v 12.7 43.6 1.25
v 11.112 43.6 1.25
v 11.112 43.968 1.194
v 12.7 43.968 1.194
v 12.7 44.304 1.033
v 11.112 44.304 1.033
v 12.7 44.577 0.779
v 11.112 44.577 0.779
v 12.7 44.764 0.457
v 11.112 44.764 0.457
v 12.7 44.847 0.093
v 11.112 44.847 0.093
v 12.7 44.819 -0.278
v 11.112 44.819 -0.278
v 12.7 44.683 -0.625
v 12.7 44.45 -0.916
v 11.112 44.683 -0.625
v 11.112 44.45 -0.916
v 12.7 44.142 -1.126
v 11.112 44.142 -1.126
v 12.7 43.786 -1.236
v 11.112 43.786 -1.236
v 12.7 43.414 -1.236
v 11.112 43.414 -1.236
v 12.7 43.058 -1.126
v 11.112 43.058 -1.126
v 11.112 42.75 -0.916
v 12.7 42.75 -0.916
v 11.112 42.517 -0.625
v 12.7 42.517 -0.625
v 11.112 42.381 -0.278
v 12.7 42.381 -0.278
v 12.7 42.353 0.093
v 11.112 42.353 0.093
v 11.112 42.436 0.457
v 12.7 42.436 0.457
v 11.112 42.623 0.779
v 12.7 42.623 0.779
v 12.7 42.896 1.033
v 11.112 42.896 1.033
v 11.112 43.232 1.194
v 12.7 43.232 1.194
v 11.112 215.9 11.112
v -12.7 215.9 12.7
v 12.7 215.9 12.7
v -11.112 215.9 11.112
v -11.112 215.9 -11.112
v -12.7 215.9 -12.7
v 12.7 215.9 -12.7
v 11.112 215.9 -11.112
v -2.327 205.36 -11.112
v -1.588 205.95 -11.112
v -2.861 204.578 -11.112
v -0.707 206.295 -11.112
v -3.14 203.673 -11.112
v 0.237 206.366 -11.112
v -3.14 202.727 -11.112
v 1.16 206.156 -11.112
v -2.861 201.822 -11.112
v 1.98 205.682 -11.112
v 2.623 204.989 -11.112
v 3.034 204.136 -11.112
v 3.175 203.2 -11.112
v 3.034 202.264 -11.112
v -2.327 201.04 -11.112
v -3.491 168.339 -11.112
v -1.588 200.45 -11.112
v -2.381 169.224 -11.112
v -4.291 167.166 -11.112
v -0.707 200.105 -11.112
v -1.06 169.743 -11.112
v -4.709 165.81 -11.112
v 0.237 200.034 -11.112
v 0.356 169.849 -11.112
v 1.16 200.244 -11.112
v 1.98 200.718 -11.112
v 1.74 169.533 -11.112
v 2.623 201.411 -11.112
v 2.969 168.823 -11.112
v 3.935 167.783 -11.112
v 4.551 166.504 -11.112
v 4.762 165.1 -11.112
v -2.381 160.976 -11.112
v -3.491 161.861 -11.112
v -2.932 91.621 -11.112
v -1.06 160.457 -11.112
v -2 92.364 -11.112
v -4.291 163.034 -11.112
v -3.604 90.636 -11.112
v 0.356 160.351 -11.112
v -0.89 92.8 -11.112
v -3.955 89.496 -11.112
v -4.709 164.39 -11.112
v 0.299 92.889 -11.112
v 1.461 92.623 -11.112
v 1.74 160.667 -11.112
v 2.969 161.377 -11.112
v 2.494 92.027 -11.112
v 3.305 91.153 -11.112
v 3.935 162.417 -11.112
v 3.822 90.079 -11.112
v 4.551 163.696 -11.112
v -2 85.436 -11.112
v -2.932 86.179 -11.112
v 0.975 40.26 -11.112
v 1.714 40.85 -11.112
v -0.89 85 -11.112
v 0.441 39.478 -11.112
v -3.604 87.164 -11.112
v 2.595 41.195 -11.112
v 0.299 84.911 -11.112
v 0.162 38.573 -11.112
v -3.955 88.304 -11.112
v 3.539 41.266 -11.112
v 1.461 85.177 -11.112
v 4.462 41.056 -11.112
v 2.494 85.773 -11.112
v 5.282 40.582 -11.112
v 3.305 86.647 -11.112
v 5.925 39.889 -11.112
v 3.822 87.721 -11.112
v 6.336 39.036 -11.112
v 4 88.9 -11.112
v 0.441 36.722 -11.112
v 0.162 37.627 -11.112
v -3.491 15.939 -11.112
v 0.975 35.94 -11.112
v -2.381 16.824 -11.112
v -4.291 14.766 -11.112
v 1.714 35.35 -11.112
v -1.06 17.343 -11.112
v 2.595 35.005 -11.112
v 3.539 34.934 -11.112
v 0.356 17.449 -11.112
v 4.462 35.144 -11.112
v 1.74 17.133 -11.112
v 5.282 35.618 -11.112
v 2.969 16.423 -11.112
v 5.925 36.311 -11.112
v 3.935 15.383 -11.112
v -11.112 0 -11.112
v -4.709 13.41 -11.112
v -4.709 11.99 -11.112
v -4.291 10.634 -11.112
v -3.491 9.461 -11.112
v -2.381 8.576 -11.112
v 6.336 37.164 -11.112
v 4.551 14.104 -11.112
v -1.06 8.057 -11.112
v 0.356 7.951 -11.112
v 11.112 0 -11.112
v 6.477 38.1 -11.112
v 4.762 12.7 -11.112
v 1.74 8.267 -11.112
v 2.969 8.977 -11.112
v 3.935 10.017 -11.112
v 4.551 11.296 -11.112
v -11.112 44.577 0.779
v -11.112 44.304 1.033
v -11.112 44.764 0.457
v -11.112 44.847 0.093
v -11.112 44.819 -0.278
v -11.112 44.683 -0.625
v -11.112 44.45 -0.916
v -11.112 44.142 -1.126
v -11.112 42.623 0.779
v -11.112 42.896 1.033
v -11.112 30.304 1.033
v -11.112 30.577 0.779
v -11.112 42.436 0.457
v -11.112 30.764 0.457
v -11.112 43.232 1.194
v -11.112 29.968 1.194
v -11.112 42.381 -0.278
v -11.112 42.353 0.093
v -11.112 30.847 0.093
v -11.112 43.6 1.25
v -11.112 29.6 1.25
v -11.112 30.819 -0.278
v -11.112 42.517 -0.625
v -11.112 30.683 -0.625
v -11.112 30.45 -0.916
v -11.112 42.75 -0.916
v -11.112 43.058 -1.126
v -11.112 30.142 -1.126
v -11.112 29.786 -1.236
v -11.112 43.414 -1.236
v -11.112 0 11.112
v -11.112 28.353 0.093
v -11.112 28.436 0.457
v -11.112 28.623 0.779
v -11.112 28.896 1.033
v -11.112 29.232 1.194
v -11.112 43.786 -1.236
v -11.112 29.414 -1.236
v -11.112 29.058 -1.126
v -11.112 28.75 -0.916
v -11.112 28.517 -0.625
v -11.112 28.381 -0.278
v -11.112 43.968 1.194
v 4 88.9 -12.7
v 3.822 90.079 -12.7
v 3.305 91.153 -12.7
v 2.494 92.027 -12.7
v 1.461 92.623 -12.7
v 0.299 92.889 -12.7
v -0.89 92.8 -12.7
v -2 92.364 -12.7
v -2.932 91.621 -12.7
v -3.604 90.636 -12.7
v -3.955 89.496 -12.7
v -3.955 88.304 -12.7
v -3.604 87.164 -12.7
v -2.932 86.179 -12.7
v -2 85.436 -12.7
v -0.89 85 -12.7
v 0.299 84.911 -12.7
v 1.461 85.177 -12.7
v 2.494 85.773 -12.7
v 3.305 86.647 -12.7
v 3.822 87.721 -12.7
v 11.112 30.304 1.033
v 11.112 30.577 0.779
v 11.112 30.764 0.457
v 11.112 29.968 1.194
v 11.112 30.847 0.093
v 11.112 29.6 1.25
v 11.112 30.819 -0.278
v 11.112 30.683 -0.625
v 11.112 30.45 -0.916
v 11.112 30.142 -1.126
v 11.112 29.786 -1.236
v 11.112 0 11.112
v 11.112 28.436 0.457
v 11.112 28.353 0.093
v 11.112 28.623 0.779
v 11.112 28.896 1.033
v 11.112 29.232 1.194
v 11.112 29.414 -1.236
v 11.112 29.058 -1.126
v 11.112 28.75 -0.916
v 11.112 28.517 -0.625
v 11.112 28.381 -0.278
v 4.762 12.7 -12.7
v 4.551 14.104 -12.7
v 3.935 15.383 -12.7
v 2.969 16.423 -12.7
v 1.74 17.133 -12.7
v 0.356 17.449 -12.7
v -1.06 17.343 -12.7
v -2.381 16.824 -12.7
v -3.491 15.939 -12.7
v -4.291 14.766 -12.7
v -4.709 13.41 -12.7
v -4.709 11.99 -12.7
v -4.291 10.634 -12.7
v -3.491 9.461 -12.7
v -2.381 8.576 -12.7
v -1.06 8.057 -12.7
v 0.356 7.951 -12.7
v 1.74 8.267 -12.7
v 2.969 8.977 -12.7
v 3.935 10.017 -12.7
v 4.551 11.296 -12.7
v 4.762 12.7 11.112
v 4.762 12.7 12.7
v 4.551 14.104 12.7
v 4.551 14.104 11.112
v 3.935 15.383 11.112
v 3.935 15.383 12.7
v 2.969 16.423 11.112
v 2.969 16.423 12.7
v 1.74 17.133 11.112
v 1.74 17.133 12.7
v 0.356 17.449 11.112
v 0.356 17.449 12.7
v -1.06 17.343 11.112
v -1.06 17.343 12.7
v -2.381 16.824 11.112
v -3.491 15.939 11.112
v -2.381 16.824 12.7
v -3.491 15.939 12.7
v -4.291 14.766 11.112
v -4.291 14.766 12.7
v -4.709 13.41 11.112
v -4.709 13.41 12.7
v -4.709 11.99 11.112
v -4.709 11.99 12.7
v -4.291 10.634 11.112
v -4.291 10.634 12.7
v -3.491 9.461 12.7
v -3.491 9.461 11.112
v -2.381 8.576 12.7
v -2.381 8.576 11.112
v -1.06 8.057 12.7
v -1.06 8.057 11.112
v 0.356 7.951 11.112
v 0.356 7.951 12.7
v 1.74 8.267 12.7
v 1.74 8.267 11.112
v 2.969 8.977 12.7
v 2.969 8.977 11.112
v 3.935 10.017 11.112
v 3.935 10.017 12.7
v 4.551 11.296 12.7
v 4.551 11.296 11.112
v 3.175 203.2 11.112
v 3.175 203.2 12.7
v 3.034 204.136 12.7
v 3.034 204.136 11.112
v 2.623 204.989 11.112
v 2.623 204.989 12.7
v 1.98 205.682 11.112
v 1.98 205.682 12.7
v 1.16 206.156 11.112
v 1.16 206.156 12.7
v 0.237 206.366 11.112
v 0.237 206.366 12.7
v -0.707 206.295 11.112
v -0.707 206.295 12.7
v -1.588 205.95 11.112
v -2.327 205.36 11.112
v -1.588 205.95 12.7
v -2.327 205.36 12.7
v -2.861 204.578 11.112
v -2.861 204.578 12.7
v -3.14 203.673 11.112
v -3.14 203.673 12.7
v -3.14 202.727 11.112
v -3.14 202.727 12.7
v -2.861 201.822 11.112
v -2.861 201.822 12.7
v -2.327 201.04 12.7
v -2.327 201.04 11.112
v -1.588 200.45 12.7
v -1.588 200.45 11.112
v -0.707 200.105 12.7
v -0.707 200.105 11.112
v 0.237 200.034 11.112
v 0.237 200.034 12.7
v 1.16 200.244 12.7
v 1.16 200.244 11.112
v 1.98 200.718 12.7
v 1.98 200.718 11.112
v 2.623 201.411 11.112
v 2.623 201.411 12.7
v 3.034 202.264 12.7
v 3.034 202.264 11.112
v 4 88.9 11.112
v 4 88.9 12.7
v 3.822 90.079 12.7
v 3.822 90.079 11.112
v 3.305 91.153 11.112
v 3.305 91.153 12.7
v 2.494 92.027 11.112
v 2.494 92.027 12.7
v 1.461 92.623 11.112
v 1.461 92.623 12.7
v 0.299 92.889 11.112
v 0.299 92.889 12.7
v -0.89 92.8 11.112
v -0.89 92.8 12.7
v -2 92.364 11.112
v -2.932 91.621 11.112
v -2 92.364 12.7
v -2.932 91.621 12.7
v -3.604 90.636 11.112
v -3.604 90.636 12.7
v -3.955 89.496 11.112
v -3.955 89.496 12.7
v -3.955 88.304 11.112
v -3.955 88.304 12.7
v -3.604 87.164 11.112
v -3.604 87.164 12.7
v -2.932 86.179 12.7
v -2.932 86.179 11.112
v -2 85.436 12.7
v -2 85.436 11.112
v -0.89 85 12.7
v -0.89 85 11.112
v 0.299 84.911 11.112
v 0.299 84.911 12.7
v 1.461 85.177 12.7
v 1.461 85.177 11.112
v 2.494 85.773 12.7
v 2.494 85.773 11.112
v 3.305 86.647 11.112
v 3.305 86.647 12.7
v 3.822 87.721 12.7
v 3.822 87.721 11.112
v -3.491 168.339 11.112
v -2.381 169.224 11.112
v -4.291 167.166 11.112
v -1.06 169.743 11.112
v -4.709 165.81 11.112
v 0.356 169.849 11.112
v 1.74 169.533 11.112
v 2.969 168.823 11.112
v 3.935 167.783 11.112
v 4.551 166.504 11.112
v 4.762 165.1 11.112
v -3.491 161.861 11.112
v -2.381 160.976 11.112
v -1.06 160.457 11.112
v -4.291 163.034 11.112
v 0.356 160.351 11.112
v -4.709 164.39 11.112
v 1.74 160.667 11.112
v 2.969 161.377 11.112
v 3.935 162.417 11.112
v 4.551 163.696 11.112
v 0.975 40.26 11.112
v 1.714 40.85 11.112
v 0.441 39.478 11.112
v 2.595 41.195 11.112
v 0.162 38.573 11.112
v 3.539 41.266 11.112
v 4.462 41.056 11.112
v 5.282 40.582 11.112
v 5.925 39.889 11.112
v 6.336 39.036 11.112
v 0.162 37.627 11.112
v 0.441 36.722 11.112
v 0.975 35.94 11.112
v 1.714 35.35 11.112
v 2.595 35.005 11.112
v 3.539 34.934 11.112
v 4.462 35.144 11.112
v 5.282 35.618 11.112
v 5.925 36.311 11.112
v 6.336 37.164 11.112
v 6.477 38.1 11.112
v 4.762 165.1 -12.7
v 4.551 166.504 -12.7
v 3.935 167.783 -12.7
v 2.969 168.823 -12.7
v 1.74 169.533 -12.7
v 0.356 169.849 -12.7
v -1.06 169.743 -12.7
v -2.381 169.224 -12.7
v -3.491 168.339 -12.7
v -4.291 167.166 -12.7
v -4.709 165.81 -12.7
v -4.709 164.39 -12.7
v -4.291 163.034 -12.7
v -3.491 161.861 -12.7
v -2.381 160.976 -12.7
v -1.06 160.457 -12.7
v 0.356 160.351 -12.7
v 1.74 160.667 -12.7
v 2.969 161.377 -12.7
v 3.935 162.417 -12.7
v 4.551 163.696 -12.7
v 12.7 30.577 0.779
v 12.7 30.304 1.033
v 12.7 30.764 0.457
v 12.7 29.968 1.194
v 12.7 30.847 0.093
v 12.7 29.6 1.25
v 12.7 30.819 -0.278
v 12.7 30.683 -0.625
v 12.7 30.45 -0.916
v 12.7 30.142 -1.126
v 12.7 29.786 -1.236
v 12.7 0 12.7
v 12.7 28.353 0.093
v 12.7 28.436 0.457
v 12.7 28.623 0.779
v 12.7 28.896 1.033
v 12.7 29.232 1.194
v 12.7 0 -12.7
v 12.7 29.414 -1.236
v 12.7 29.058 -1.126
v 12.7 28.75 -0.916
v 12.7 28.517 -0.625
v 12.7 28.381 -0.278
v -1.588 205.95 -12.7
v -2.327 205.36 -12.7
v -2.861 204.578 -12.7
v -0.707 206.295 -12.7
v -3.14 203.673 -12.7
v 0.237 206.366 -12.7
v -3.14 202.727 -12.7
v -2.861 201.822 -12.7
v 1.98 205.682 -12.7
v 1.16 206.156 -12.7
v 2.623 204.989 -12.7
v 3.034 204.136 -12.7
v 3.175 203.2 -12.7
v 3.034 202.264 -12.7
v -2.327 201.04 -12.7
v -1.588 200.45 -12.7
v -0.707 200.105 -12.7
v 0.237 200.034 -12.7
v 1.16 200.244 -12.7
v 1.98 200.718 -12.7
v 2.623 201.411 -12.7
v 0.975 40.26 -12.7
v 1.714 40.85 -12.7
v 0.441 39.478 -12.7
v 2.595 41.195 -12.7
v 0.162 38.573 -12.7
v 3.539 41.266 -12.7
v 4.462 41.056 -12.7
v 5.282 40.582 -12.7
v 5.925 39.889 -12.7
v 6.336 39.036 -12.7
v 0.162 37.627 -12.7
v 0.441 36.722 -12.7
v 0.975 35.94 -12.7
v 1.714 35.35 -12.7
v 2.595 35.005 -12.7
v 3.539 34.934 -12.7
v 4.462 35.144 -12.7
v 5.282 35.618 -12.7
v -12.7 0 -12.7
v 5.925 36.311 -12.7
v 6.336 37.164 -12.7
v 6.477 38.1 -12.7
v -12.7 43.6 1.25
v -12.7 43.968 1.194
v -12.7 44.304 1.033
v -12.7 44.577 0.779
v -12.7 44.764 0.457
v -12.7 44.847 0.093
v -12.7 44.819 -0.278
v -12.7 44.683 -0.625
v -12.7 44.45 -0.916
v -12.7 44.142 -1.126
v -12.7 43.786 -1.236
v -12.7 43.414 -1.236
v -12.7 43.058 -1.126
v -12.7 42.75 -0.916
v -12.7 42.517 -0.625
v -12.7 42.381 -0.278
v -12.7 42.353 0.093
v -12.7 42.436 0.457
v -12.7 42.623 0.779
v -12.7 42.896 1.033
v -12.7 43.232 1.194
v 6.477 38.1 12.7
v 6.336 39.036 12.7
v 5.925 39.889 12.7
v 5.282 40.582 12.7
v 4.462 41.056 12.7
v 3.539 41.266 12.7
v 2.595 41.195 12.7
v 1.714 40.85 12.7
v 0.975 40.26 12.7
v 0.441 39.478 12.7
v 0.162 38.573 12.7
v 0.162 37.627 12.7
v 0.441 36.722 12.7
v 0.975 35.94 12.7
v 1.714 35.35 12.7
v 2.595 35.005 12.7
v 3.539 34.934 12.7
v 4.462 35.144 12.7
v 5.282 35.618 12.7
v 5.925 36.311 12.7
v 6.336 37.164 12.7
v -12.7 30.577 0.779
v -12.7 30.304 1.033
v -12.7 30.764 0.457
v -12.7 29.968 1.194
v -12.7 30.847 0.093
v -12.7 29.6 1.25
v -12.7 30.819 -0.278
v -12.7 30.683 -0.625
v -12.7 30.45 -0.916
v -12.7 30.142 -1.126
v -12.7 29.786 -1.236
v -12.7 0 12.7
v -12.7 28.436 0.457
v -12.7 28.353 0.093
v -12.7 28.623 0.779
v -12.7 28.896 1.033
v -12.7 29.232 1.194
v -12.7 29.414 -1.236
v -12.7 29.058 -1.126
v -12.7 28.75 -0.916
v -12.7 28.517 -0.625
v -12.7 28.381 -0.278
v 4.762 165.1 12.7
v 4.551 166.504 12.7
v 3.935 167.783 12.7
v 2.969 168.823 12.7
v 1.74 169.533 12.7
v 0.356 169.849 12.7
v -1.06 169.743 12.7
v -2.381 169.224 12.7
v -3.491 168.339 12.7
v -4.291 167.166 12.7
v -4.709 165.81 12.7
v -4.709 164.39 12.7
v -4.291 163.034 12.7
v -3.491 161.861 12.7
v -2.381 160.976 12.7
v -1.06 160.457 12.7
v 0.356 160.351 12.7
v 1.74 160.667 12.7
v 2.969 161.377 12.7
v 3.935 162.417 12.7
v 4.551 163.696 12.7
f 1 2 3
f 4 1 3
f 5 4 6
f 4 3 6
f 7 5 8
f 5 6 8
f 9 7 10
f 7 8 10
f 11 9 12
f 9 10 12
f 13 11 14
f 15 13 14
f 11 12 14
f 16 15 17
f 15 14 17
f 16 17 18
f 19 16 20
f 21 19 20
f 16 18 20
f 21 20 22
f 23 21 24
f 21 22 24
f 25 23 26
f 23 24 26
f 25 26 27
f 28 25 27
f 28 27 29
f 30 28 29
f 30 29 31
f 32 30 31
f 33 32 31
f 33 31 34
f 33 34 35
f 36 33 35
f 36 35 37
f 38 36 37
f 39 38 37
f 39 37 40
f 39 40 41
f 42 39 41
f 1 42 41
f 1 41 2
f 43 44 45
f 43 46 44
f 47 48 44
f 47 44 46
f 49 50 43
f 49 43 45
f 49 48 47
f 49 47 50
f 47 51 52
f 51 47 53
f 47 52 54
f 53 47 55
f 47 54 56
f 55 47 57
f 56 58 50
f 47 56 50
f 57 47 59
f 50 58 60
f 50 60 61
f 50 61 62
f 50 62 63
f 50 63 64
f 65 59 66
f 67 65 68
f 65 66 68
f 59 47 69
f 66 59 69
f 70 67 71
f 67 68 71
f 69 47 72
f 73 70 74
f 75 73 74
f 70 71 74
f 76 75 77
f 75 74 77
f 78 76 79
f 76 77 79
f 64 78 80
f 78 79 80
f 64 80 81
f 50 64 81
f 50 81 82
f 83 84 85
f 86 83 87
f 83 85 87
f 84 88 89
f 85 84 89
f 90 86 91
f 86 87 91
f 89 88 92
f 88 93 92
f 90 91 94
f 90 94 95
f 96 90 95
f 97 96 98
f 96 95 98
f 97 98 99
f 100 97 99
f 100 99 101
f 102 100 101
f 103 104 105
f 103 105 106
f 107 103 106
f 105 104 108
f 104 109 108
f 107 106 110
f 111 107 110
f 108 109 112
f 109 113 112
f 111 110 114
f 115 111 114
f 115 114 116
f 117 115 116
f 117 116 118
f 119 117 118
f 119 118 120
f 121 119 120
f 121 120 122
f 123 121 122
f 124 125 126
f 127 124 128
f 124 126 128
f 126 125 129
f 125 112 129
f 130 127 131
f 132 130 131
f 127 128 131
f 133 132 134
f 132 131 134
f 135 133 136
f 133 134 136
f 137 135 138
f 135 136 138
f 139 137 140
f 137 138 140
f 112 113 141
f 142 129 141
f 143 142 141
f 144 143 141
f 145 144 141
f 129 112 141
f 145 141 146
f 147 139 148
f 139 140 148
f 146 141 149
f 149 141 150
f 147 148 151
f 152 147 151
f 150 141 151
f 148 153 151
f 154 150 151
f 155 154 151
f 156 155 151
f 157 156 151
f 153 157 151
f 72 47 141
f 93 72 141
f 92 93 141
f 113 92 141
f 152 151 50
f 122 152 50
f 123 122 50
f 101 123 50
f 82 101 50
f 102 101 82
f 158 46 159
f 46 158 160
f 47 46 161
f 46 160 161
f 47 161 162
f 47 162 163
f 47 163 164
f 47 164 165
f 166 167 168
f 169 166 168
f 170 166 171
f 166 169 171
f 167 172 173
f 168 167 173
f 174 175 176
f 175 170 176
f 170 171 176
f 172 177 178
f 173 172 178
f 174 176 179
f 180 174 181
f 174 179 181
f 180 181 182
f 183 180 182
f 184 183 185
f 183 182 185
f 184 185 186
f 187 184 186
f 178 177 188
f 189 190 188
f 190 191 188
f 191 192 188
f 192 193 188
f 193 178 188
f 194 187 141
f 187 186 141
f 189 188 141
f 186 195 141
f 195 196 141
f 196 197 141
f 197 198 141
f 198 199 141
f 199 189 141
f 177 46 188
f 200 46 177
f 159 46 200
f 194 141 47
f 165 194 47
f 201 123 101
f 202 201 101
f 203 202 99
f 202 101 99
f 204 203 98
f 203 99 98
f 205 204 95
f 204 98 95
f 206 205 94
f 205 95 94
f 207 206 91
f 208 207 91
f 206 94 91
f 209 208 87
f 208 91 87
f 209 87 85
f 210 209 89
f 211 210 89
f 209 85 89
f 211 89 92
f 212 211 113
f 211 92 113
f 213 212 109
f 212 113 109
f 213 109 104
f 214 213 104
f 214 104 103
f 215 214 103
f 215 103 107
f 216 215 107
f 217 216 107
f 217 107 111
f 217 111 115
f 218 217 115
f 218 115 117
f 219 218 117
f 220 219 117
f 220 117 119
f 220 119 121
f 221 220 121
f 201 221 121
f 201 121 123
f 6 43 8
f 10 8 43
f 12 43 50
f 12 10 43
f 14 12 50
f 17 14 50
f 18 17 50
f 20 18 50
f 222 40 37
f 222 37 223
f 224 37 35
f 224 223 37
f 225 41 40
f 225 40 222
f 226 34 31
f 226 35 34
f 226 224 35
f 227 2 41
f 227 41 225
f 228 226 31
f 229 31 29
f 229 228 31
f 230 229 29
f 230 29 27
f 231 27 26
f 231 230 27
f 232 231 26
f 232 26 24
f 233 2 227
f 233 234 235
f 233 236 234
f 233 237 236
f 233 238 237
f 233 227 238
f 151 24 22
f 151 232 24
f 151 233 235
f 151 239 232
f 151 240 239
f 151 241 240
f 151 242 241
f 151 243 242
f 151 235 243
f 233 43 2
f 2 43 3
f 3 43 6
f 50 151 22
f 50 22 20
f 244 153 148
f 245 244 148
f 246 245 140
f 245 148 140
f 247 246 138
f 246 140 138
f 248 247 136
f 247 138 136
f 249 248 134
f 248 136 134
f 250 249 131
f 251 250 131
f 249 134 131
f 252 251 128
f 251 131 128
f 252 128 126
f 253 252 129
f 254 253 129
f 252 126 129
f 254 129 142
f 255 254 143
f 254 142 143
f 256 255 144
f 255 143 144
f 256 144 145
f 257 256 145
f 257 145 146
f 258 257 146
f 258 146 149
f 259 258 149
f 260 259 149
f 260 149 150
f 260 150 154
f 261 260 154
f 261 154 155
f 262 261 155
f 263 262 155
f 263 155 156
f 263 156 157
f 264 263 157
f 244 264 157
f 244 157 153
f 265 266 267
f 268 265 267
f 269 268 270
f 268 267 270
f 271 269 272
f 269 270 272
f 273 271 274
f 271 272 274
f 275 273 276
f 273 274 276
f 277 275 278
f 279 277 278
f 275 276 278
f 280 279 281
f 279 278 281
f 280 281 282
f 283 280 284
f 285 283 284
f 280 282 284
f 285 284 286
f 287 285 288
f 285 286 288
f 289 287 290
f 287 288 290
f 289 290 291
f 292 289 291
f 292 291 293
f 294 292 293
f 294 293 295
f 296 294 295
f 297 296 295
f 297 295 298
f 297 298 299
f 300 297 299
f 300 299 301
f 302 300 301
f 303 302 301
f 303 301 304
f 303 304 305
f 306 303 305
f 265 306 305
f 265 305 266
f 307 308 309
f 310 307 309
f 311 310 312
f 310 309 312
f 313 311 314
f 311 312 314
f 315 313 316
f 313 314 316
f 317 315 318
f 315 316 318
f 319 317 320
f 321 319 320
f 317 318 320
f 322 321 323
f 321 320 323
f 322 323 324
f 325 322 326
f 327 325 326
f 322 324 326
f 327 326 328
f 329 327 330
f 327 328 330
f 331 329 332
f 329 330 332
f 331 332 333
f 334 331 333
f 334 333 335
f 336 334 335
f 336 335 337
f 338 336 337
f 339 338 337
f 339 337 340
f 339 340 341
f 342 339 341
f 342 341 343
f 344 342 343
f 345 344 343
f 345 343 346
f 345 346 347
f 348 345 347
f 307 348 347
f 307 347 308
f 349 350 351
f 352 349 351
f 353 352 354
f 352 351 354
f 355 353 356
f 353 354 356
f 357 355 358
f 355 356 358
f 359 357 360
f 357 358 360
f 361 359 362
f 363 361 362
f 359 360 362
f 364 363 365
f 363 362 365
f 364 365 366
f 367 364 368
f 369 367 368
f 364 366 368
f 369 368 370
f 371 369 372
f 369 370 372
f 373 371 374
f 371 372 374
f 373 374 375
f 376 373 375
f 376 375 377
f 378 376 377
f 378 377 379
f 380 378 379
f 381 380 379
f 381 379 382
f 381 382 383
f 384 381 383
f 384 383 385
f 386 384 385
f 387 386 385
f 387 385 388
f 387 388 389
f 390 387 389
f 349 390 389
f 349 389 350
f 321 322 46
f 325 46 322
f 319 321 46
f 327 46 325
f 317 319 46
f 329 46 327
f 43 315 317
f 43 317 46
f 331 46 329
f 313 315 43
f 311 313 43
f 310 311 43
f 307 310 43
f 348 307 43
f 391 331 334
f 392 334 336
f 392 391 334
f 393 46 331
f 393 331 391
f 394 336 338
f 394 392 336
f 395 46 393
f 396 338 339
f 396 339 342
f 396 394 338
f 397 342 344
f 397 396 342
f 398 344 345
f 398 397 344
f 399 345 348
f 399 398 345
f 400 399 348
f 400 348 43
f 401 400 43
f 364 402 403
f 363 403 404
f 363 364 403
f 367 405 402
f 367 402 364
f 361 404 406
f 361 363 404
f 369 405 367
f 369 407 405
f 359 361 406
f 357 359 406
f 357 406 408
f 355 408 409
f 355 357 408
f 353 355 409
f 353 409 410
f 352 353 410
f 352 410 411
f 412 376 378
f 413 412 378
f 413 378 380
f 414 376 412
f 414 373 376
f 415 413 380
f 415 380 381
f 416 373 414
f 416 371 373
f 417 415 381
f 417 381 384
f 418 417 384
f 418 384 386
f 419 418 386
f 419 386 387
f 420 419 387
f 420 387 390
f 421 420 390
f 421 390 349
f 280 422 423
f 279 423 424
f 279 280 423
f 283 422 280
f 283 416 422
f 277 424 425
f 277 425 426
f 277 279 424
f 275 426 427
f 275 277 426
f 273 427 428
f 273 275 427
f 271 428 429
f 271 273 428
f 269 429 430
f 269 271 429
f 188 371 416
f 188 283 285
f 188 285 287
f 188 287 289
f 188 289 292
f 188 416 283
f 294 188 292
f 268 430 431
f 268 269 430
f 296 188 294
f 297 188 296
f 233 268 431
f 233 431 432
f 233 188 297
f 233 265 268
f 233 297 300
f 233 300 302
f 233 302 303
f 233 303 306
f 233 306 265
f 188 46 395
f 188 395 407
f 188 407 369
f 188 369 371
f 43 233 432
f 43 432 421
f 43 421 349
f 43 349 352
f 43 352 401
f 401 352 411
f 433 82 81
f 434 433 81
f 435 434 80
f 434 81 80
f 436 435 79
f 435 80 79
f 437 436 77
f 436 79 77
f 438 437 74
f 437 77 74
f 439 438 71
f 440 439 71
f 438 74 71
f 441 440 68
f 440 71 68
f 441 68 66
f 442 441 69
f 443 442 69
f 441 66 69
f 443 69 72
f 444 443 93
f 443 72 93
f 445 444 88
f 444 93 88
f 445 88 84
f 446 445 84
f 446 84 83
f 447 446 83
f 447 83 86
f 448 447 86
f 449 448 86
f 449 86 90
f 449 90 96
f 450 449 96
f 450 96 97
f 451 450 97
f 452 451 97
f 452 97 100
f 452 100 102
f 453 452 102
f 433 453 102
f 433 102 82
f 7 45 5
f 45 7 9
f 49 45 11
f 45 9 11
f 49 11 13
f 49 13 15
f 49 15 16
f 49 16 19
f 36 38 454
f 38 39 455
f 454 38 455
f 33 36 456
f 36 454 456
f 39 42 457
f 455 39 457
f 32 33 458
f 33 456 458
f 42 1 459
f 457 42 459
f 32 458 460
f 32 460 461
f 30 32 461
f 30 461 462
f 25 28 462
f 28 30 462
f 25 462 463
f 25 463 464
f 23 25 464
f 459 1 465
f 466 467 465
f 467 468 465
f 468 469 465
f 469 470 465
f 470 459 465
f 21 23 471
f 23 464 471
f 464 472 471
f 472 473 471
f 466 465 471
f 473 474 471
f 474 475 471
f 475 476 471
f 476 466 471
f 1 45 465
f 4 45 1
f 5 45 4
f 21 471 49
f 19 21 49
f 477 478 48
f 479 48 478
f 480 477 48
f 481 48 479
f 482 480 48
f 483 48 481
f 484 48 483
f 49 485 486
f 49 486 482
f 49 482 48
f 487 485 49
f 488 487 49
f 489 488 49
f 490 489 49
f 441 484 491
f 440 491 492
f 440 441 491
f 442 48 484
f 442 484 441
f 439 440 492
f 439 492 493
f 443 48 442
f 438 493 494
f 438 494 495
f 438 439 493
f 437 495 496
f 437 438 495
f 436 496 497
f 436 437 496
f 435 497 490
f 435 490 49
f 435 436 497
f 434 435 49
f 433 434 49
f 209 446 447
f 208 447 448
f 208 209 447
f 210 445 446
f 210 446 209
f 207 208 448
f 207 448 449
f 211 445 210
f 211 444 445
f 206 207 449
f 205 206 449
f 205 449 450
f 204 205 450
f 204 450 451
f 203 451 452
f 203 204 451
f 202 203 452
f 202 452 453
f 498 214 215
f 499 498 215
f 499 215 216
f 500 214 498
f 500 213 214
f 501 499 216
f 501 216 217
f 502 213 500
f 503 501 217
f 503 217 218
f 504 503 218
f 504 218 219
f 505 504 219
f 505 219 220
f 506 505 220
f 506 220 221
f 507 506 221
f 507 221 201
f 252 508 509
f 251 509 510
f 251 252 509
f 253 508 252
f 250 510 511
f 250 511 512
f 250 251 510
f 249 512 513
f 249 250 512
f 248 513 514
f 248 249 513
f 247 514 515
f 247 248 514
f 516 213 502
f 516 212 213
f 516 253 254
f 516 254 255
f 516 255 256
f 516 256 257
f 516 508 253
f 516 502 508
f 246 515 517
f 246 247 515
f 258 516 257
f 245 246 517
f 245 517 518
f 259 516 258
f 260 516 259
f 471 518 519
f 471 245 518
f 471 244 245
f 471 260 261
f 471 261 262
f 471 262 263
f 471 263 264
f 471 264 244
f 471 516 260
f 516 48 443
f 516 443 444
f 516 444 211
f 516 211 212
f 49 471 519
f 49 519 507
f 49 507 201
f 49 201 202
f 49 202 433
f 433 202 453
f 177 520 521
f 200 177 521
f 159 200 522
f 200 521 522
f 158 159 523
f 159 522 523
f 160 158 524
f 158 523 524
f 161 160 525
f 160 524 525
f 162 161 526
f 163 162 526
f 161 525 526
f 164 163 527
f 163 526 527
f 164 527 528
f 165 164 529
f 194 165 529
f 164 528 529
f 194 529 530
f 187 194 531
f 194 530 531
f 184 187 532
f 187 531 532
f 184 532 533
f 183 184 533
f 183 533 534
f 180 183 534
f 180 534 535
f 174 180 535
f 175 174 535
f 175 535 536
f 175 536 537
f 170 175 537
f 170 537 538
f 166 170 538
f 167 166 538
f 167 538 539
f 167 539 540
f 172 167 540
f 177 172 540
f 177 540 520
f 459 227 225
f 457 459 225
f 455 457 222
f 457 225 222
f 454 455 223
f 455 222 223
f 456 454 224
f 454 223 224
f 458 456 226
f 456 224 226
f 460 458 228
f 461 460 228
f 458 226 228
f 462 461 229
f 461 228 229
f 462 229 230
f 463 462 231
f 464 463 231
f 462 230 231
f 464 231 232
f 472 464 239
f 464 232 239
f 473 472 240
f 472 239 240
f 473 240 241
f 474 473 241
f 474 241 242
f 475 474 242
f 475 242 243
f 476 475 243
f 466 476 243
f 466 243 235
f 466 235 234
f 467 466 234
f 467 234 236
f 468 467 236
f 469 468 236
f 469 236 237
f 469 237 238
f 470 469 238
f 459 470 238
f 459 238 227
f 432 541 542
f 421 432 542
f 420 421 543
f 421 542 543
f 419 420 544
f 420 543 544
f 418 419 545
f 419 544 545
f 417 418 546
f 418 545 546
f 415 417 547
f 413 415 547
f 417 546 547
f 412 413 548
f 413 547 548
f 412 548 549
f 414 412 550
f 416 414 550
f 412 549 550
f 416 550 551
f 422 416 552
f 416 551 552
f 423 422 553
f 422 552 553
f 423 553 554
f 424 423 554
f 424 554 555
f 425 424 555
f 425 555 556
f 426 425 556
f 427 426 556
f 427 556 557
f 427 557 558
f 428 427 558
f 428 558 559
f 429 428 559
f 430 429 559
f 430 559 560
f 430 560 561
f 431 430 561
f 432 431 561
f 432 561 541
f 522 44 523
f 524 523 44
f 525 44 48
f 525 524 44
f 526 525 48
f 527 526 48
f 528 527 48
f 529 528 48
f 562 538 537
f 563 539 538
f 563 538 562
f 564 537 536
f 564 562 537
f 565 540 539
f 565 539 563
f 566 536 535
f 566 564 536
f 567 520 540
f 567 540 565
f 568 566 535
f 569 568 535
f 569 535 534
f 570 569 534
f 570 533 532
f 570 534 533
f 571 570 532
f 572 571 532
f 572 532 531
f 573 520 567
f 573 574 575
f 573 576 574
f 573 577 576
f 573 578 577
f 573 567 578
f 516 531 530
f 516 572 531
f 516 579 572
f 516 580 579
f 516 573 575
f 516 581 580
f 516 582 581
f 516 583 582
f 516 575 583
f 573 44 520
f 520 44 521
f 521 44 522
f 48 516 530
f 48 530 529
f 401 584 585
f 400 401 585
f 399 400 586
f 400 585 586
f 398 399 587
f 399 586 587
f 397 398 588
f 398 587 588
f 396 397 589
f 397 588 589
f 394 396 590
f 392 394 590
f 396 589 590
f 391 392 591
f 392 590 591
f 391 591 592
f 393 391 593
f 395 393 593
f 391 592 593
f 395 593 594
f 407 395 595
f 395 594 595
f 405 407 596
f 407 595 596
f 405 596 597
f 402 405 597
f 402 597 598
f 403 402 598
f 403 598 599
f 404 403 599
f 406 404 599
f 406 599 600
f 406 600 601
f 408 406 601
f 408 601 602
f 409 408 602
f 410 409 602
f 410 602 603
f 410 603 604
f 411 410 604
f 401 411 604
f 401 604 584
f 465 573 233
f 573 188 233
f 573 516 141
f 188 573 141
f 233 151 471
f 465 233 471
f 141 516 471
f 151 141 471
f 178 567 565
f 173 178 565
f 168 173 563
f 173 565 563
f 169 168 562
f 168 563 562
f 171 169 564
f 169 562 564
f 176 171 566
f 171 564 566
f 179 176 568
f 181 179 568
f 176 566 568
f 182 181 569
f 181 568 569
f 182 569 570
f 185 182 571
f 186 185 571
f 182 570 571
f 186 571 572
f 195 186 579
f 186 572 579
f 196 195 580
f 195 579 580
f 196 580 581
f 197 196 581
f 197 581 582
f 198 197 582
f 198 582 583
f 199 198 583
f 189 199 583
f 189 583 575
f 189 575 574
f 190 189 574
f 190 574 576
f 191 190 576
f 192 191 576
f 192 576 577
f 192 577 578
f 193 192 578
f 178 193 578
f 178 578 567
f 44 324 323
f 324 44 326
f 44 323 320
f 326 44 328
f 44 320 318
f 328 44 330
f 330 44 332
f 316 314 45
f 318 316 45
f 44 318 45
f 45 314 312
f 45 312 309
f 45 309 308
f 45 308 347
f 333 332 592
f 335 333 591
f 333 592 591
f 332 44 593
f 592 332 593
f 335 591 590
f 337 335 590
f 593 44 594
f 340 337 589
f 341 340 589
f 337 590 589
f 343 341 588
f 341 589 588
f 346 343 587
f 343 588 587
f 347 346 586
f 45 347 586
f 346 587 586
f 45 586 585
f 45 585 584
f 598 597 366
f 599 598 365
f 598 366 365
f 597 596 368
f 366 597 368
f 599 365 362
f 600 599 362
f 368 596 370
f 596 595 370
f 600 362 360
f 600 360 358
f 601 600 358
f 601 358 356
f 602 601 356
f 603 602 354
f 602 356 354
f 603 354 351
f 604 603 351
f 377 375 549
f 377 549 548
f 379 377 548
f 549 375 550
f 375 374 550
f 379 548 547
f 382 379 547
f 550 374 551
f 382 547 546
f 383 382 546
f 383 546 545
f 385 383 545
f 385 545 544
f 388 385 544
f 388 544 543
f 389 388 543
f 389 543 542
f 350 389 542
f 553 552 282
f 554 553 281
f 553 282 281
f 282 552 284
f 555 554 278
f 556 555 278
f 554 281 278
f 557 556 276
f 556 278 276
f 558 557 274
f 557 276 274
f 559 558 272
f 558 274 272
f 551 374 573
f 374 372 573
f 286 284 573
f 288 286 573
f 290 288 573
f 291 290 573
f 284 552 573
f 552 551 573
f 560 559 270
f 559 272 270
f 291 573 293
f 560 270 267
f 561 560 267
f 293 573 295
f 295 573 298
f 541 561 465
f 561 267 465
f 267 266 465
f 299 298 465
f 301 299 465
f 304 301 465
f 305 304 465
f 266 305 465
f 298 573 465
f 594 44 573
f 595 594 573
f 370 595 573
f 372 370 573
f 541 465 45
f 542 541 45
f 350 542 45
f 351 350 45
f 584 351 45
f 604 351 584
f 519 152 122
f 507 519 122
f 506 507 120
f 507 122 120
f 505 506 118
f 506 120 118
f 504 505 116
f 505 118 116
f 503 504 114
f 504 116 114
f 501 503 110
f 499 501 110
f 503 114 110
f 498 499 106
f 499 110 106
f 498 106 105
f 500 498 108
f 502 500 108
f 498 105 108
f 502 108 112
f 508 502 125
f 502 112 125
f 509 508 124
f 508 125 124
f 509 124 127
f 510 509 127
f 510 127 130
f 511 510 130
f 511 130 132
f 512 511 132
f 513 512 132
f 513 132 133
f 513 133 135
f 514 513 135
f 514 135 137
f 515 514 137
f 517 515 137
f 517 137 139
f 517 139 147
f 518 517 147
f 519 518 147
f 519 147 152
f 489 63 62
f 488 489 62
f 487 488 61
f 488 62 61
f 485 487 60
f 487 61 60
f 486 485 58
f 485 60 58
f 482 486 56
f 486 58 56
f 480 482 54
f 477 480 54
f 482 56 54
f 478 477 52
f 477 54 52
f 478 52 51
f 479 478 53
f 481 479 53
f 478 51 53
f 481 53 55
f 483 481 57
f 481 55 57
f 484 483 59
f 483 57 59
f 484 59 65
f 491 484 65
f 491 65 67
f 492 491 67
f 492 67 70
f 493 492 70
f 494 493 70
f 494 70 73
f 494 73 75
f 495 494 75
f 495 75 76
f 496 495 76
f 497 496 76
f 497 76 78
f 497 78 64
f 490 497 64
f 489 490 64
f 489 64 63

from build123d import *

# Parameters (mm, degrees)
SKETCH1_W           = 25.4
SKETCH1_H           = 25.4
SKETCH1_W_2         = 22.225
SKETCH1_H_2         = 22.225
BOSS_EXTRUDE1_DEPTH = 215.9
SKETCH2_R           = 4
SKETCH2_R_2         = 4.7625
SKETCH2_R_3         = 3.175
CUT_EXTRUDE1_DEPTH  = 218.759638133
SKETCH3_R           = 3.175
CUT_EXTRUDE2_DEPTH  = 218.759638133
SKETCH5_R           = 1.25
CUT_EXTRUDE3_DEPTH  = 218.759638133


with BuildPart() as part:
    # Sketch1 → Boss-Extrude1 (new body)
    with BuildSketch(Plane(origin=(0, 0, 0), x_dir=(1, 0, 0), z_dir=(0, 1, 0))):
        Rectangle(SKETCH1_W, SKETCH1_H)
        Rectangle(SKETCH1_W_2, SKETCH1_H_2, mode=Mode.SUBTRACT)
    extrude(amount=BOSS_EXTRUDE1_DEPTH)

    # Sketch2 → Cut-Extrude1 (cut, through all)
    with BuildSketch(Plane.XY.offset(12.7)):
        with Locations((0, 88.9)):
            Circle(SKETCH2_R)
        with Locations((0, 165.1)):
            Circle(SKETCH2_R_2)
        with Locations((0, 12.7)):
            Circle(SKETCH2_R_2)
        with Locations((0, 203.2)):
            Circle(SKETCH2_R_3)
    extrude(amount=-CUT_EXTRUDE1_DEPTH, mode=Mode.SUBTRACT)

    # Sketch3 → Cut-Extrude2 (cut, through all)
    with BuildSketch(Plane.XY.offset(12.7)):
        with Locations((3.302, 38.1)):
            Circle(SKETCH3_R)
    extrude(amount=-CUT_EXTRUDE2_DEPTH, mode=Mode.SUBTRACT)

    # Sketch5 → Cut-Extrude3 (cut, through all)
    with BuildSketch(Plane.ZY.offset(12.7)):
        with Locations((0, 43.6)):
            Circle(SKETCH5_R)
        with Locations((0, 29.6)):
            Circle(SKETCH5_R)
    extrude(amount=-CUT_EXTRUDE3_DEPTH, mode=Mode.SUBTRACT)


solid = part.part
